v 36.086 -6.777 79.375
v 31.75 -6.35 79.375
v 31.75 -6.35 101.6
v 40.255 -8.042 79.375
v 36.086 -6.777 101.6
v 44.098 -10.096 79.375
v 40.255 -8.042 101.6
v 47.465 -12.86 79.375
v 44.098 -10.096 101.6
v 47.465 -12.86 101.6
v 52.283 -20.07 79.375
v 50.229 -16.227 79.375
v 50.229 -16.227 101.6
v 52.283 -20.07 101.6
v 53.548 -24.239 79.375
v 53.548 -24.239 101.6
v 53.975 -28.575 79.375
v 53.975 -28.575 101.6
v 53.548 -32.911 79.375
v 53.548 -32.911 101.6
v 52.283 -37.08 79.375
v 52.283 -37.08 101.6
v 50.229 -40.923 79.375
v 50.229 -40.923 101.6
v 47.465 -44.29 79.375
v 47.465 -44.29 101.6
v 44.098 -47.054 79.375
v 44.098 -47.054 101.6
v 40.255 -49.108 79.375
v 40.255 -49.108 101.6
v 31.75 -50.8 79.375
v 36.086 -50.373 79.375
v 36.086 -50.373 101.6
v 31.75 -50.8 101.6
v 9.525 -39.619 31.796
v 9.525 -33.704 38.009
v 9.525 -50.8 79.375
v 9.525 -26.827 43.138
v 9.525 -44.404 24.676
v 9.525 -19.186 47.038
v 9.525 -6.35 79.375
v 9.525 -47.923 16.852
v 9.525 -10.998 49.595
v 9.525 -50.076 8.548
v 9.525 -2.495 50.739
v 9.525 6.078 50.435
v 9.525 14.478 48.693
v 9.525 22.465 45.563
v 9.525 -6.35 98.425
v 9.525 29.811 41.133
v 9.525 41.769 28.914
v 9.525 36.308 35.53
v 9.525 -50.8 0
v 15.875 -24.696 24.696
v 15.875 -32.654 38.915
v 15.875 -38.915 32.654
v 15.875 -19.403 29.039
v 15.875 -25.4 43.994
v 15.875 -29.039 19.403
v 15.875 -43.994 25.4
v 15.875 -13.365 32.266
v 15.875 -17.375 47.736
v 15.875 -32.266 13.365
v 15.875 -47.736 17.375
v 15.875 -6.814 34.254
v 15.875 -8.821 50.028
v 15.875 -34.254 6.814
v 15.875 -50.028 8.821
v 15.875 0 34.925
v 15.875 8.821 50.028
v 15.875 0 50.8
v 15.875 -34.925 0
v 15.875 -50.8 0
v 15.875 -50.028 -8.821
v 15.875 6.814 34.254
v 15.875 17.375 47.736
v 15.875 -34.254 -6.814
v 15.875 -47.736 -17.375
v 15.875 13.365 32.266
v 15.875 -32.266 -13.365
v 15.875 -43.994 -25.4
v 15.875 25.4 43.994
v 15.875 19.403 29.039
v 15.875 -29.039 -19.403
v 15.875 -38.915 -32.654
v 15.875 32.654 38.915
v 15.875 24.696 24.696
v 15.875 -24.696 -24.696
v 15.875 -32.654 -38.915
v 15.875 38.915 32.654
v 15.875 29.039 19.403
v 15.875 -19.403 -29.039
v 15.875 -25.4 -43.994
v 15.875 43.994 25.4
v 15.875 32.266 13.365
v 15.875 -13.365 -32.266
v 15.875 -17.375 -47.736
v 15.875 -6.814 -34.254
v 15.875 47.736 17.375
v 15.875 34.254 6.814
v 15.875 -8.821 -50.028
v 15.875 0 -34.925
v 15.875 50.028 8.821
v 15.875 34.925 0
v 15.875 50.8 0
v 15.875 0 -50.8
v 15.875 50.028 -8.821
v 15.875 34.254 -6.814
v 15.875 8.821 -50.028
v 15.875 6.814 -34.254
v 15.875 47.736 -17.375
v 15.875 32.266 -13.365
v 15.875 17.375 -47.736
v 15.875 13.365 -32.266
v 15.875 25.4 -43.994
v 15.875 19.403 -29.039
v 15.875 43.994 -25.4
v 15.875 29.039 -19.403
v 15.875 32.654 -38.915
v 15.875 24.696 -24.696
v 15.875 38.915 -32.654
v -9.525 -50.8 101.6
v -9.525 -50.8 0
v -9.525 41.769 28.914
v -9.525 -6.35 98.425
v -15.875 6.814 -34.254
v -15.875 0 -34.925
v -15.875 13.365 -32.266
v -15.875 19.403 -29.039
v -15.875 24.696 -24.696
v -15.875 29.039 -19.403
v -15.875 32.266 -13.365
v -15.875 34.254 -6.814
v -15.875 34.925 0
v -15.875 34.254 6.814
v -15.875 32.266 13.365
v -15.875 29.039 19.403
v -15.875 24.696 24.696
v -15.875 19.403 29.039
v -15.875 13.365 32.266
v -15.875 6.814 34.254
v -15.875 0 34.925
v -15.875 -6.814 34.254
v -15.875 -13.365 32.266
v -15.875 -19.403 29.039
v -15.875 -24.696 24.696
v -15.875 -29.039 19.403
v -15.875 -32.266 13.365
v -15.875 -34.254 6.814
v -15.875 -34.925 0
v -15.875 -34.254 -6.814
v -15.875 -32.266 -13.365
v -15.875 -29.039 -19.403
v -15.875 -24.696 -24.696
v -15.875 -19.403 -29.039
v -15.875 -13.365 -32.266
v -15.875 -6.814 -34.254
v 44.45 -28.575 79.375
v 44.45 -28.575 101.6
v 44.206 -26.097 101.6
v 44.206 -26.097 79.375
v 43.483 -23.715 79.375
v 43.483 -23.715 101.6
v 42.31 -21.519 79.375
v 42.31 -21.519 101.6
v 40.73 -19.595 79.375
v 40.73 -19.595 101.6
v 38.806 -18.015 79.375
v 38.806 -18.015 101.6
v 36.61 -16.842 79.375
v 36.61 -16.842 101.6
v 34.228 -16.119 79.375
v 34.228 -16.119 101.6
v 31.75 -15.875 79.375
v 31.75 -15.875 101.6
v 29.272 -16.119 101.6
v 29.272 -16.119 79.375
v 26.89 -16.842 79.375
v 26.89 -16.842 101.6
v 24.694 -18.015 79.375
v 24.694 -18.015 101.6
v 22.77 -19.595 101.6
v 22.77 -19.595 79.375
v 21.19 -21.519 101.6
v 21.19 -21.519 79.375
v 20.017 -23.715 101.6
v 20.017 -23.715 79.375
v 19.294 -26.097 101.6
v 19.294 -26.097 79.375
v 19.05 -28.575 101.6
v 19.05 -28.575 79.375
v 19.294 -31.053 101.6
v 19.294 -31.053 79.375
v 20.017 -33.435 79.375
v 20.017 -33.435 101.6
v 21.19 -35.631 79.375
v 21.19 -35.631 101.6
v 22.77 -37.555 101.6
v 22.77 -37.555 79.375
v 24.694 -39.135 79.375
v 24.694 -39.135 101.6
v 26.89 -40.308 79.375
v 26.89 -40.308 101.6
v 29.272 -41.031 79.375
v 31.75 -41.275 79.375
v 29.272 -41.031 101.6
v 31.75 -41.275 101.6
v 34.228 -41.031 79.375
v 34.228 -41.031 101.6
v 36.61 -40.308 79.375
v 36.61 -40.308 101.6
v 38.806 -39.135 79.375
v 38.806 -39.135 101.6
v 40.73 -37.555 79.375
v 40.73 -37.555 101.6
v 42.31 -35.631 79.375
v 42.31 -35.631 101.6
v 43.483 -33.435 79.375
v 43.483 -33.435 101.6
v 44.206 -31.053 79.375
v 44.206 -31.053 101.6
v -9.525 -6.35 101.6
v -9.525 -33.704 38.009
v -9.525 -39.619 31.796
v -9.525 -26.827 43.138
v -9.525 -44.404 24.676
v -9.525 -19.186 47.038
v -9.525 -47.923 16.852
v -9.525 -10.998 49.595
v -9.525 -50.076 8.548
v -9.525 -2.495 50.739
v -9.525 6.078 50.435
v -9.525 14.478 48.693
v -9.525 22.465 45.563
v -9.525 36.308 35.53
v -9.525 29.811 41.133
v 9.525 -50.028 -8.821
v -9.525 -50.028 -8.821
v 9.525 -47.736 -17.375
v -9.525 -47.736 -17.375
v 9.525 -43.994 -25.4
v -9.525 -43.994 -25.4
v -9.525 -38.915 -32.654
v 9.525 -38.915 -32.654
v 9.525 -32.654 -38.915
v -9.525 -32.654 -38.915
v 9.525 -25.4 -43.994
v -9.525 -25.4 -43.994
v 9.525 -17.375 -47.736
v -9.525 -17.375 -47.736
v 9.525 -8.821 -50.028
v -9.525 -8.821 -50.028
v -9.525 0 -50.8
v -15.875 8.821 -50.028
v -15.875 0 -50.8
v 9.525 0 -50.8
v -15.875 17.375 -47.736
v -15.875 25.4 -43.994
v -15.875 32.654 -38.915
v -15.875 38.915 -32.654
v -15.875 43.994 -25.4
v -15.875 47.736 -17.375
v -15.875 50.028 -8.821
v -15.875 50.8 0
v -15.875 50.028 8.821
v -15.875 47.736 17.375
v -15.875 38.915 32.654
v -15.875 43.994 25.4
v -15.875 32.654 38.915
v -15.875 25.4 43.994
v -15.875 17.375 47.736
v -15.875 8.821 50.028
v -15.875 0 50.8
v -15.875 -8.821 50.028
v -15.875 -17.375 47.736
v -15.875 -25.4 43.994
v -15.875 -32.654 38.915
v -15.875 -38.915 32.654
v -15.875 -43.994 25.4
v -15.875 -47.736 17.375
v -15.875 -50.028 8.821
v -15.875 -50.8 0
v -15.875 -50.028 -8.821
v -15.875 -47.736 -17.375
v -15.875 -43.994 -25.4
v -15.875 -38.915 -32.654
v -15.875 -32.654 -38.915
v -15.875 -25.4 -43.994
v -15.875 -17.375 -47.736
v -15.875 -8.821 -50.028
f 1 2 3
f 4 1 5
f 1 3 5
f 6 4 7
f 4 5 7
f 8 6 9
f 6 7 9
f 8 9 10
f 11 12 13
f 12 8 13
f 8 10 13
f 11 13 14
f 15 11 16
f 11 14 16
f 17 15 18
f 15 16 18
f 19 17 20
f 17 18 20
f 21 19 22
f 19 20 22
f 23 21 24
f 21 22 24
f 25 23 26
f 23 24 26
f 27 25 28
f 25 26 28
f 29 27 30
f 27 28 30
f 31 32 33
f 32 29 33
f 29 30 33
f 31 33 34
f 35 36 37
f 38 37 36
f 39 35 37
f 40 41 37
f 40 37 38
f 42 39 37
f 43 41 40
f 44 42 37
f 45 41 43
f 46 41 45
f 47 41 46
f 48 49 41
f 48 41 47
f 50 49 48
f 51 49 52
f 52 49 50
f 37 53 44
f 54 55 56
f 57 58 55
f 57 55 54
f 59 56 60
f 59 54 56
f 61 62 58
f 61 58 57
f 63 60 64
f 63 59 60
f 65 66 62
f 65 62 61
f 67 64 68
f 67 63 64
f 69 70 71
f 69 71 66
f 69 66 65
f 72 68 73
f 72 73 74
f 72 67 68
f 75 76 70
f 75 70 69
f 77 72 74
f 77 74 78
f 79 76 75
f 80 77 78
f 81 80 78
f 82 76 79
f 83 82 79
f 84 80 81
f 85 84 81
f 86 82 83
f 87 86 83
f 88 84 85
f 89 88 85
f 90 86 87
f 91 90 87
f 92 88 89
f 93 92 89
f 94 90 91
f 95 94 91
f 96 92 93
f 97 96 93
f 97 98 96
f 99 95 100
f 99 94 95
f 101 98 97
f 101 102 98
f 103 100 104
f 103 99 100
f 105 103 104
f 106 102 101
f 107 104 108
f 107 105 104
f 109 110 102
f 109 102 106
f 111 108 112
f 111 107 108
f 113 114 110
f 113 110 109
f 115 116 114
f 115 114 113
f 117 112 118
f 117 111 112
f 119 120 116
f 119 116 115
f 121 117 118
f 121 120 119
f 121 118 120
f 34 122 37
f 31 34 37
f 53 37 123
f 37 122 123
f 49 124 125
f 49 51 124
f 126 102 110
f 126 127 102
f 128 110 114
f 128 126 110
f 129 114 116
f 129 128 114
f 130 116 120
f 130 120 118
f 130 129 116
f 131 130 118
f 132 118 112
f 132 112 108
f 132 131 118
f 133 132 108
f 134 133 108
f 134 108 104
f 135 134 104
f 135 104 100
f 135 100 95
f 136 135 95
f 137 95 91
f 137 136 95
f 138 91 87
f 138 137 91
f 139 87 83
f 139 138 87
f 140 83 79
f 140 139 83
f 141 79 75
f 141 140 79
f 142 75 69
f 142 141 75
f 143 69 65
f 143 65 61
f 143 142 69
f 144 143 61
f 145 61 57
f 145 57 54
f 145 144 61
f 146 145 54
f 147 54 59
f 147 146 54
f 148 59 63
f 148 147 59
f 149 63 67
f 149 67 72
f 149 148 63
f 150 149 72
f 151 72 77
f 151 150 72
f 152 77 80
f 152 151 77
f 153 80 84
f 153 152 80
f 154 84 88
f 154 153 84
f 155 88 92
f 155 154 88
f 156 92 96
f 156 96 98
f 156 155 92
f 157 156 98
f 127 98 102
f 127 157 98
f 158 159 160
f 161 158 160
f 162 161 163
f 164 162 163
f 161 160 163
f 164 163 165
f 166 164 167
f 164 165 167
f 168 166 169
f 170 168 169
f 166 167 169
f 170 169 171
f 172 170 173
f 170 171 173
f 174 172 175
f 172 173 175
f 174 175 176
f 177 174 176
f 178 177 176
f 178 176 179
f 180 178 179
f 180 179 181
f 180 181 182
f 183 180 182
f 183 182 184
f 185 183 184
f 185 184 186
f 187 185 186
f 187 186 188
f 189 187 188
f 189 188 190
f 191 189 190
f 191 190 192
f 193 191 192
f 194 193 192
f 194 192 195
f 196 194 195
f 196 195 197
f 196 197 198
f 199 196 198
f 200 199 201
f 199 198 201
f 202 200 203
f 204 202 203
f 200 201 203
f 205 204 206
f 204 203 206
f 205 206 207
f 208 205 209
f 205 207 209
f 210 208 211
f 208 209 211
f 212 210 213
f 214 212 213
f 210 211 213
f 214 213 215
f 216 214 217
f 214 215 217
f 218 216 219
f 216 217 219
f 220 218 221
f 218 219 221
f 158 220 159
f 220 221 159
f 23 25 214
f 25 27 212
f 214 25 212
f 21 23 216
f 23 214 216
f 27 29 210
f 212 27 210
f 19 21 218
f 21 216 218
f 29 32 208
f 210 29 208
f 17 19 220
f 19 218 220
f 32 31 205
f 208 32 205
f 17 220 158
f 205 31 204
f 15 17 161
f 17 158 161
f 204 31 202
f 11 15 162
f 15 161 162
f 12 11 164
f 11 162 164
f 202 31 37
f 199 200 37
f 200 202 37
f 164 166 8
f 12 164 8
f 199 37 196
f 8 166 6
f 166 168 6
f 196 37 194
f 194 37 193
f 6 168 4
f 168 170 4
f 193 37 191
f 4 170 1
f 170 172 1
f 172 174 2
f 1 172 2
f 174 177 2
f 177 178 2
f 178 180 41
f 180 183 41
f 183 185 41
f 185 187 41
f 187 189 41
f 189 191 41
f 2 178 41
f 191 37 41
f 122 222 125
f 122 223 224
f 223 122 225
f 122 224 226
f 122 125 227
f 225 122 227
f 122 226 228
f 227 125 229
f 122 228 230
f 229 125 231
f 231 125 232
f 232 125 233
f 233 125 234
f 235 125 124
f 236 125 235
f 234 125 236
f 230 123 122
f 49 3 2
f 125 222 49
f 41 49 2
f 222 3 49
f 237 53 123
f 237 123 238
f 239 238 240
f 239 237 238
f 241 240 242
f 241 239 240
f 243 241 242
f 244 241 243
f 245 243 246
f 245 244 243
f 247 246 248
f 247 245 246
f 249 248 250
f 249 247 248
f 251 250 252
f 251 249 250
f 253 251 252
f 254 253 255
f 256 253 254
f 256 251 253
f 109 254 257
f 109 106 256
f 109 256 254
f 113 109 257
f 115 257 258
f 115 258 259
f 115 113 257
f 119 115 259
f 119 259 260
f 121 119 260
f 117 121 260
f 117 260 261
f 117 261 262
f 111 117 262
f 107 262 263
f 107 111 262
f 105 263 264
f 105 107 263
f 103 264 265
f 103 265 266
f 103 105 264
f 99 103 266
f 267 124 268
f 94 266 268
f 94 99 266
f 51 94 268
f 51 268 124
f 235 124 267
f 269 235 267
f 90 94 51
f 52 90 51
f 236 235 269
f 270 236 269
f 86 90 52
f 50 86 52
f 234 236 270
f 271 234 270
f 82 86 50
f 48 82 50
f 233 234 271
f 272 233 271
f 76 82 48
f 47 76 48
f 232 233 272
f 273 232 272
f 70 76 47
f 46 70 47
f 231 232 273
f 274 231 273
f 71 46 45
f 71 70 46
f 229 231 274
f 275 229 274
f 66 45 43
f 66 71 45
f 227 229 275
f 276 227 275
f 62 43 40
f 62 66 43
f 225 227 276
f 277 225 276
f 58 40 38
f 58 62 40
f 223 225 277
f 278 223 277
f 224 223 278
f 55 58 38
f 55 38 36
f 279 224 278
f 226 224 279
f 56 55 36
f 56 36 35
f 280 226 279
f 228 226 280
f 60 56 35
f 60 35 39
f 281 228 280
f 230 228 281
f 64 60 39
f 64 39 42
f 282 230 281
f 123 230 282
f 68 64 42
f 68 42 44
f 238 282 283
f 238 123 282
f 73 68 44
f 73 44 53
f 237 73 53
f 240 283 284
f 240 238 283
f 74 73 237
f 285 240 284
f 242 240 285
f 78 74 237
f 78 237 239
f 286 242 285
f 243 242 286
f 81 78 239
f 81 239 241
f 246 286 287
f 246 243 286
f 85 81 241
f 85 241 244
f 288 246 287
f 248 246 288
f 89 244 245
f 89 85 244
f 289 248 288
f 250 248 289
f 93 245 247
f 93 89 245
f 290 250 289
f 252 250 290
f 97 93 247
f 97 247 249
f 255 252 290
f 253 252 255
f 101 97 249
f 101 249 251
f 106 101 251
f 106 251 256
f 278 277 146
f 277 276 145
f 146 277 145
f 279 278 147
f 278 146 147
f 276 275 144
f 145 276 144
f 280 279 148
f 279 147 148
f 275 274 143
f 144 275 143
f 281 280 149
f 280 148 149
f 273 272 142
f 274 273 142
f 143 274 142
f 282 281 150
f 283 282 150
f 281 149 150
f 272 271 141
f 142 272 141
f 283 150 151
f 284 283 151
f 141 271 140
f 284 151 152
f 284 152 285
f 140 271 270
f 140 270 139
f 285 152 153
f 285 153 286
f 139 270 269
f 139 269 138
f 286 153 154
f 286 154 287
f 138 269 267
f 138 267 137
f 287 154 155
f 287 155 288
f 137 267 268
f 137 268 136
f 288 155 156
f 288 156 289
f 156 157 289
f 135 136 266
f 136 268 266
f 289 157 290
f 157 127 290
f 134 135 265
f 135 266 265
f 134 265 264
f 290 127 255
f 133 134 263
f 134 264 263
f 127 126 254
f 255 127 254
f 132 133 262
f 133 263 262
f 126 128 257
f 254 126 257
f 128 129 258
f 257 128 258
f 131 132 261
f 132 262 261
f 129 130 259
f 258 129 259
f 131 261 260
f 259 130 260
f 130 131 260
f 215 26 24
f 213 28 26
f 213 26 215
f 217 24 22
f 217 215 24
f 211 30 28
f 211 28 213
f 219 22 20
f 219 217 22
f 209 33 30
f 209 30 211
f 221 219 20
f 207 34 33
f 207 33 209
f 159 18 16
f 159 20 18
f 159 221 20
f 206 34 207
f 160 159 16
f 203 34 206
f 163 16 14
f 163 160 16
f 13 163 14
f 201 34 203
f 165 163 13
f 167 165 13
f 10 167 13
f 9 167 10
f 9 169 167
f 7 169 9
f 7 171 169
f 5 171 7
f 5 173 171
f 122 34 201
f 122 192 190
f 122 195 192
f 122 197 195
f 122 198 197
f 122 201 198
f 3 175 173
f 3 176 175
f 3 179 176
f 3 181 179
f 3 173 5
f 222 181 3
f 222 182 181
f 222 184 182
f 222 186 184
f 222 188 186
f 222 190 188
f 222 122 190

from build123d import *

# Parameters (mm, degrees)
SKETCH1_R           = 34.925
BOSS_EXTRUDE1_DEPTH = 9.525
SKETCH1_3_R         = 34.925
BOSS_EXTRUDE2_DEPTH = 15.875
SKETCH2_W           = 22.225
SKETCH2_H           = 44.45
BOSS_EXTRUDE3_DEPTH = 50.8
SKETCH3_R           = 12.7
CUT_EXTRUDE1_DEPTH  = 172.596927784


with BuildPart() as part:
    # Sketch1 → Boss-Extrude1 (new, symmetric)
    with BuildSketch(Plane(origin=(0, 0, 0), x_dir=(0, 0, -1), z_dir=(1, 0, 0))):
        with BuildLine():
            Line((-101.6, -50.8), (0, -50.8))
            ThreePointArc((0, -50.8), (48.489607735, 15.145888606), (-28.914102256, 41.768584974))
            Line((-28.914102256, 41.768584974), (-98.425, -6.35))
            Line((-98.425, -6.35), (-101.6, -6.35))
            Line((-101.6, -6.35), (-101.6, -50.8))
        make_face()
        Circle(SKETCH1_R, mode=Mode.SUBTRACT)
    extrude(amount=BOSS_EXTRUDE1_DEPTH, both=True)

    # Sketch1<3> → Boss-Extrude2 (add, symmetric)
    with BuildSketch(Plane(origin=(0, 0, 0), x_dir=(0, 0, -1), z_dir=(1, 0, 0))):
        with BuildLine():
            ThreePointArc((-28.914102256, 41.768584974), (-48.489607735, -15.145888606), (0, -50.8))
            ThreePointArc((0, -50.8), (35.921024484, -35.921024484), (50.8, 0))
            ThreePointArc((50.8, 0), (23.577569906, 44.997090987), (-28.914102256, 41.768584974))
        make_face()
        Circle(SKETCH1_3_R, mode=Mode.SUBTRACT)
    extrude(amount=BOSS_EXTRUDE2_DEPTH, both=True)

    # Sketch2 → Boss-Extrude3 (add)
    with BuildSketch(Plane(origin=(9.525, 0, 0), x_dir=(0, 0, -1), z_dir=(1, 0, 0))):
        with Locations((-90.4875, -28.575)):
            Rectangle(SKETCH2_W, SKETCH2_H)
    extrude(amount=BOSS_EXTRUDE3_DEPTH)

    # Sketch3 → Cut-Extrude1 (cut, through all)
    with BuildSketch(Plane.XY.offset(101.6)):
        with BuildLine():
            Line((60.325, -50.8), (60.325, -6.35))
            Line((60.325, -6.35), (31.75, -6.35))
            ThreePointArc((31.75, -6.35), (53.975, -28.575), (31.75, -50.8))
            Line((31.75, -50.8), (60.325, -50.8))
        make_face()
        with Locations((31.75, -28.575)):
            Circle(SKETCH3_R)
    extrude(amount=-CUT_EXTRUDE1_DEPTH, mode=Mode.SUBTRACT)


solid = part.part
